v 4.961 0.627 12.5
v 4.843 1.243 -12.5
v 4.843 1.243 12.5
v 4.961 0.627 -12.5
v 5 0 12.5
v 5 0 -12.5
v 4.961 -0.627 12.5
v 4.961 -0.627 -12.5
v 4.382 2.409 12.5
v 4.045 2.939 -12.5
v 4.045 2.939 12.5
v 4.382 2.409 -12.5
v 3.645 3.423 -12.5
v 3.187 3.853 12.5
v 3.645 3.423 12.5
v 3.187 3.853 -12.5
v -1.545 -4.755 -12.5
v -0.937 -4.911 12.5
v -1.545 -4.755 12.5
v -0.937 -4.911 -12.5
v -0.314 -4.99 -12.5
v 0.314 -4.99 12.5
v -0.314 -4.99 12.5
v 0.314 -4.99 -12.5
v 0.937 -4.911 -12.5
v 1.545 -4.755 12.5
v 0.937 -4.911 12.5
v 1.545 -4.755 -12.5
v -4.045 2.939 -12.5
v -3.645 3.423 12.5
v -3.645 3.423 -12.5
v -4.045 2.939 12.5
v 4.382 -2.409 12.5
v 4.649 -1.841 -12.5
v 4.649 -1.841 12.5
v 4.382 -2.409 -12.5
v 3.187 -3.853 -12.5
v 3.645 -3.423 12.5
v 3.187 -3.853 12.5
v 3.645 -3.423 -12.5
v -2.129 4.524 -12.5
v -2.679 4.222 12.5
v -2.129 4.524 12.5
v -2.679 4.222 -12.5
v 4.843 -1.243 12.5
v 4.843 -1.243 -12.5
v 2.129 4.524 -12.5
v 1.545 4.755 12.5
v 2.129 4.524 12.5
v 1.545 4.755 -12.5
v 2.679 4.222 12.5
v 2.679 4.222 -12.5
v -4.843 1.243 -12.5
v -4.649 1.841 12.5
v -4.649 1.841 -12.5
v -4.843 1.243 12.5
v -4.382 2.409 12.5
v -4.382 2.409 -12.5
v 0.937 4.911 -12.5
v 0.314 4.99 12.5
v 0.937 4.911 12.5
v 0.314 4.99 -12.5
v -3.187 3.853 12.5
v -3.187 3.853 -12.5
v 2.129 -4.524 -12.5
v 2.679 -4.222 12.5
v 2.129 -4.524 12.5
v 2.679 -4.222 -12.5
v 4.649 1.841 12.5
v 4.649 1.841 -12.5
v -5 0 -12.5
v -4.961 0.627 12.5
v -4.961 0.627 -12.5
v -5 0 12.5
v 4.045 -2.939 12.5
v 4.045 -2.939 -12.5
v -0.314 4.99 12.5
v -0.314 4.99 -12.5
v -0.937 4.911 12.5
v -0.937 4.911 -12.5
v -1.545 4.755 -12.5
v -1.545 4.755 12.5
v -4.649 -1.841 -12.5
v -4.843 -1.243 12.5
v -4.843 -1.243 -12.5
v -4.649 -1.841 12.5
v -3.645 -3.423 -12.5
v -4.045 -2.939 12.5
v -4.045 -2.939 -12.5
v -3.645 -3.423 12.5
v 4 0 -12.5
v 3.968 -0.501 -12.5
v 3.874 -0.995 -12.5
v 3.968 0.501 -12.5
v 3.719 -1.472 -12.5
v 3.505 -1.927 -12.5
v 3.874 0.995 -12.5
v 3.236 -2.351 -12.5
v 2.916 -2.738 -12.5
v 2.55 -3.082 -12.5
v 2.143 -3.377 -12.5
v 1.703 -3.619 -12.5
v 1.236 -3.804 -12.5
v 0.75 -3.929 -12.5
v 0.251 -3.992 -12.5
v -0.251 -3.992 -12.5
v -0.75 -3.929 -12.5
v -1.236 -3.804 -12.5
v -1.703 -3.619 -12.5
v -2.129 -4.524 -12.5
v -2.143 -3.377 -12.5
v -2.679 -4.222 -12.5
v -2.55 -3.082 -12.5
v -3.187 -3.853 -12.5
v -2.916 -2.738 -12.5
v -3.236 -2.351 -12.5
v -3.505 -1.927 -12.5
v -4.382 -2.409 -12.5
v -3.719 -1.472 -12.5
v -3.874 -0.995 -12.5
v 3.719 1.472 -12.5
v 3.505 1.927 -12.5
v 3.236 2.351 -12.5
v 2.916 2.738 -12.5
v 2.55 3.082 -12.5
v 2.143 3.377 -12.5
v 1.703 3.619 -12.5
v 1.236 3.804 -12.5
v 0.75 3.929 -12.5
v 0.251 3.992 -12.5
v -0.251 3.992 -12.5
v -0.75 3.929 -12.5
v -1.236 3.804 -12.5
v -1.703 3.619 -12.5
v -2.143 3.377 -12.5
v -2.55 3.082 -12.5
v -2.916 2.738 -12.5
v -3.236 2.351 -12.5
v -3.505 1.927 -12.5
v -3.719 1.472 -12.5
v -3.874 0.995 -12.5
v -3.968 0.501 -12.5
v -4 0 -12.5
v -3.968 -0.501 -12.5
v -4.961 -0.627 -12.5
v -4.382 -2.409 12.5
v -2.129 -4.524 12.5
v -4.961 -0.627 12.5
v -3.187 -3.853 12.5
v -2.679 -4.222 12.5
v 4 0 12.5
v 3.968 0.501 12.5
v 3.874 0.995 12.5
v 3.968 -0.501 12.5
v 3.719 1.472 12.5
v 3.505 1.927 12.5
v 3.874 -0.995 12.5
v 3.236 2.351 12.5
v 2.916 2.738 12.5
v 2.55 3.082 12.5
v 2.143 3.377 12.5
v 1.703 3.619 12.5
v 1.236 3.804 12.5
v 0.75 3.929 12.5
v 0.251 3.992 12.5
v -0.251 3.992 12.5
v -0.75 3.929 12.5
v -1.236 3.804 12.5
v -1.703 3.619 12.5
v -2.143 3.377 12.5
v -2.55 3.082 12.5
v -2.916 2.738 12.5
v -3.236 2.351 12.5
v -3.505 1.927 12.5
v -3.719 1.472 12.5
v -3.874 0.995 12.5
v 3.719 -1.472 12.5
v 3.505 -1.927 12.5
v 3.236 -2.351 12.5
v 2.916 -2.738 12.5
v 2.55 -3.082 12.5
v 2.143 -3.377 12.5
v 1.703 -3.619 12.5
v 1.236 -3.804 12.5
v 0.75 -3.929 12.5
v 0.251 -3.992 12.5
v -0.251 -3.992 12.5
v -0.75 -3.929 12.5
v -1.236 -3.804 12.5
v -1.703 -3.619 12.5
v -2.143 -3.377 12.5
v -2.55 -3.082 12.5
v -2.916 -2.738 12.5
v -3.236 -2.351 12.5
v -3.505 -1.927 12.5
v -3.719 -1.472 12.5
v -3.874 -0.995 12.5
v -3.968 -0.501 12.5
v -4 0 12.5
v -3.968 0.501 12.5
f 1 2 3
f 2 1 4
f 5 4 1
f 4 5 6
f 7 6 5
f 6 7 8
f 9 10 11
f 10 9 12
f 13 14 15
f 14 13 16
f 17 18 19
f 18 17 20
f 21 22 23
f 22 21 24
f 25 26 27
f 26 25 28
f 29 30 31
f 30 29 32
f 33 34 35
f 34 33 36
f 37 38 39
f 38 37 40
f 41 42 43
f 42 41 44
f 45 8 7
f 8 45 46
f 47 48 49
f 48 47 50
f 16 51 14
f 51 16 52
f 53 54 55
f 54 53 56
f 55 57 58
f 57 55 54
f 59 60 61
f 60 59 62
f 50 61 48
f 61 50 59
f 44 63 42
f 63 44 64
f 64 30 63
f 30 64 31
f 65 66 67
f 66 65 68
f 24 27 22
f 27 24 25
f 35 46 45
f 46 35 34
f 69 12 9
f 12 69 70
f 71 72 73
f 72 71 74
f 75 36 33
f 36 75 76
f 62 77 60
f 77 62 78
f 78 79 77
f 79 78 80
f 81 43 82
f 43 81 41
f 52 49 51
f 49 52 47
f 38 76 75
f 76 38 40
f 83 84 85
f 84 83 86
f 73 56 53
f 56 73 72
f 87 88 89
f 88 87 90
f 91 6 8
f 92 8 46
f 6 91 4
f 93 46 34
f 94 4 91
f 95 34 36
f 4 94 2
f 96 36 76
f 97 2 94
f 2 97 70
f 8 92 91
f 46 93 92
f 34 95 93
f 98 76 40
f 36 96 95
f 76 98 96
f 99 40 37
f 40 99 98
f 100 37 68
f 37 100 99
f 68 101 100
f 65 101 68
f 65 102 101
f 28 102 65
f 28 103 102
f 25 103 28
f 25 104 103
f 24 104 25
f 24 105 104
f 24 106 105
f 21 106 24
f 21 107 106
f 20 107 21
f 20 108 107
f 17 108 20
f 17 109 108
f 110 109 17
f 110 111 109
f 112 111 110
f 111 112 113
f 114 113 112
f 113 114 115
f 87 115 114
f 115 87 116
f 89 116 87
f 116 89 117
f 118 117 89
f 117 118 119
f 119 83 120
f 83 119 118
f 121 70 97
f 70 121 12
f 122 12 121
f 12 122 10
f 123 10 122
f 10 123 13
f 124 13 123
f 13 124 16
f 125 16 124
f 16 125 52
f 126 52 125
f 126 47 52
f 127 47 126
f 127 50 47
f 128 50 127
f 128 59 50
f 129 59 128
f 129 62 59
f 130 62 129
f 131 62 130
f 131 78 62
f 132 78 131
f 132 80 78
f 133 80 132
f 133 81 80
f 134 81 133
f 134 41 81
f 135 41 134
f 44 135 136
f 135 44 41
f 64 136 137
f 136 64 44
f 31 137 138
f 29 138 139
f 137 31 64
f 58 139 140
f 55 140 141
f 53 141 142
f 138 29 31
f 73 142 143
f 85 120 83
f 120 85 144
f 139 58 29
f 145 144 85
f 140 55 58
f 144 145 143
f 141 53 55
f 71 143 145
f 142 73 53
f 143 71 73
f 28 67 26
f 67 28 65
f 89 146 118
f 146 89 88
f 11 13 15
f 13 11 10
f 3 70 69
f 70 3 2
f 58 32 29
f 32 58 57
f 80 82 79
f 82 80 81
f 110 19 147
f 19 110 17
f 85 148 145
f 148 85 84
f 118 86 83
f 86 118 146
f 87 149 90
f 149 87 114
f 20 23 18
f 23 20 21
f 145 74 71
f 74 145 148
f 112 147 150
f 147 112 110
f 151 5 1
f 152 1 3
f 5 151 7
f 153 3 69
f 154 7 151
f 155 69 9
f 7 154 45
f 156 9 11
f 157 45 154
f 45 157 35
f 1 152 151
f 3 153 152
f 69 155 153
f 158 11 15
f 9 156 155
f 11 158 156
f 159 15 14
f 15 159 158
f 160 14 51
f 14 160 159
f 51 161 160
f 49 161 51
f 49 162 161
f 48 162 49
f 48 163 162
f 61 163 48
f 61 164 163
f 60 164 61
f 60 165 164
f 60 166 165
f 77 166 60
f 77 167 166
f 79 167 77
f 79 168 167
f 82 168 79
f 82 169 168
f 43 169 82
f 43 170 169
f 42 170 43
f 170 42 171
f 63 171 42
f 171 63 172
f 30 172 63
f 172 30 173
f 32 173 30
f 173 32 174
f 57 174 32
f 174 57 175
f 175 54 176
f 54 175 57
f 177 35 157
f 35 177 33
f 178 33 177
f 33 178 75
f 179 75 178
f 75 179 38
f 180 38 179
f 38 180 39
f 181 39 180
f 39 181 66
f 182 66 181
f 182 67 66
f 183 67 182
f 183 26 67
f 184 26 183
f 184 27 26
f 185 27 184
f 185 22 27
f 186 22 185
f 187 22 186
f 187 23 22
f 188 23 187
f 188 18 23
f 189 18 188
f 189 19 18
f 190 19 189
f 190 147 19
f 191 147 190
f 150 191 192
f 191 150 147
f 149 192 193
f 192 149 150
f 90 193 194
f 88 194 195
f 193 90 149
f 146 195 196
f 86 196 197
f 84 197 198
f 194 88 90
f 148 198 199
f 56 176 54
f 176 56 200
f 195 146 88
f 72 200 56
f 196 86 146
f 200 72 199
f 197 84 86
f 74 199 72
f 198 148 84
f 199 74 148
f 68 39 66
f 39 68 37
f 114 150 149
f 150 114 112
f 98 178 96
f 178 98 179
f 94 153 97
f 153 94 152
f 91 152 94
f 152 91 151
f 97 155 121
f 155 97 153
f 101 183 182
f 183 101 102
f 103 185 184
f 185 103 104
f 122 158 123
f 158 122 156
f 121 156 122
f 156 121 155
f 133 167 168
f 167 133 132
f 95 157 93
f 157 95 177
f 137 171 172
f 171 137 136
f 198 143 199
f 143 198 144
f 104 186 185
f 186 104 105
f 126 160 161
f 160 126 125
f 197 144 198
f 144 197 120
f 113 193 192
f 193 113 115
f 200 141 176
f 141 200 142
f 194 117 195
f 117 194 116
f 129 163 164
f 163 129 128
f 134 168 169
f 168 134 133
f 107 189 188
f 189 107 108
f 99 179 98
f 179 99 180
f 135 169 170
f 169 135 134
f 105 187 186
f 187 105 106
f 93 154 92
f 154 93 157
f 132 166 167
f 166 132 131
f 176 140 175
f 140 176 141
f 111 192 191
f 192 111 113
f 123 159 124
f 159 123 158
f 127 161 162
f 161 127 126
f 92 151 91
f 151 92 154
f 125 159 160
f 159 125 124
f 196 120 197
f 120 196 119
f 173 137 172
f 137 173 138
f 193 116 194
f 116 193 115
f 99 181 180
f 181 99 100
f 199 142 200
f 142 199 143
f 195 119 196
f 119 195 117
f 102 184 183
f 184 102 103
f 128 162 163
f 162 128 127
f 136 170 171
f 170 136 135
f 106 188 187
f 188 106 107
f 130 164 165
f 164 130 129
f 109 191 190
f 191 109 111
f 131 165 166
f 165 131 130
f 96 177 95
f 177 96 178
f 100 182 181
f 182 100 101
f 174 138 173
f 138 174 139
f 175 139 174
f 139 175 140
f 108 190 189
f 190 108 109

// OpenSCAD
$fn = 50;


difference() {
	union() {
		translate(v = [0, 0, -12.5000000000]) {
			cylinder(h = 25, r = 5.0000000000);
		}
	}
	union() {
		translate(v = [0, 0, -100.0000000000]) {
			cylinder(h = 200, r = 4.0000000000);
		}
	}
}
